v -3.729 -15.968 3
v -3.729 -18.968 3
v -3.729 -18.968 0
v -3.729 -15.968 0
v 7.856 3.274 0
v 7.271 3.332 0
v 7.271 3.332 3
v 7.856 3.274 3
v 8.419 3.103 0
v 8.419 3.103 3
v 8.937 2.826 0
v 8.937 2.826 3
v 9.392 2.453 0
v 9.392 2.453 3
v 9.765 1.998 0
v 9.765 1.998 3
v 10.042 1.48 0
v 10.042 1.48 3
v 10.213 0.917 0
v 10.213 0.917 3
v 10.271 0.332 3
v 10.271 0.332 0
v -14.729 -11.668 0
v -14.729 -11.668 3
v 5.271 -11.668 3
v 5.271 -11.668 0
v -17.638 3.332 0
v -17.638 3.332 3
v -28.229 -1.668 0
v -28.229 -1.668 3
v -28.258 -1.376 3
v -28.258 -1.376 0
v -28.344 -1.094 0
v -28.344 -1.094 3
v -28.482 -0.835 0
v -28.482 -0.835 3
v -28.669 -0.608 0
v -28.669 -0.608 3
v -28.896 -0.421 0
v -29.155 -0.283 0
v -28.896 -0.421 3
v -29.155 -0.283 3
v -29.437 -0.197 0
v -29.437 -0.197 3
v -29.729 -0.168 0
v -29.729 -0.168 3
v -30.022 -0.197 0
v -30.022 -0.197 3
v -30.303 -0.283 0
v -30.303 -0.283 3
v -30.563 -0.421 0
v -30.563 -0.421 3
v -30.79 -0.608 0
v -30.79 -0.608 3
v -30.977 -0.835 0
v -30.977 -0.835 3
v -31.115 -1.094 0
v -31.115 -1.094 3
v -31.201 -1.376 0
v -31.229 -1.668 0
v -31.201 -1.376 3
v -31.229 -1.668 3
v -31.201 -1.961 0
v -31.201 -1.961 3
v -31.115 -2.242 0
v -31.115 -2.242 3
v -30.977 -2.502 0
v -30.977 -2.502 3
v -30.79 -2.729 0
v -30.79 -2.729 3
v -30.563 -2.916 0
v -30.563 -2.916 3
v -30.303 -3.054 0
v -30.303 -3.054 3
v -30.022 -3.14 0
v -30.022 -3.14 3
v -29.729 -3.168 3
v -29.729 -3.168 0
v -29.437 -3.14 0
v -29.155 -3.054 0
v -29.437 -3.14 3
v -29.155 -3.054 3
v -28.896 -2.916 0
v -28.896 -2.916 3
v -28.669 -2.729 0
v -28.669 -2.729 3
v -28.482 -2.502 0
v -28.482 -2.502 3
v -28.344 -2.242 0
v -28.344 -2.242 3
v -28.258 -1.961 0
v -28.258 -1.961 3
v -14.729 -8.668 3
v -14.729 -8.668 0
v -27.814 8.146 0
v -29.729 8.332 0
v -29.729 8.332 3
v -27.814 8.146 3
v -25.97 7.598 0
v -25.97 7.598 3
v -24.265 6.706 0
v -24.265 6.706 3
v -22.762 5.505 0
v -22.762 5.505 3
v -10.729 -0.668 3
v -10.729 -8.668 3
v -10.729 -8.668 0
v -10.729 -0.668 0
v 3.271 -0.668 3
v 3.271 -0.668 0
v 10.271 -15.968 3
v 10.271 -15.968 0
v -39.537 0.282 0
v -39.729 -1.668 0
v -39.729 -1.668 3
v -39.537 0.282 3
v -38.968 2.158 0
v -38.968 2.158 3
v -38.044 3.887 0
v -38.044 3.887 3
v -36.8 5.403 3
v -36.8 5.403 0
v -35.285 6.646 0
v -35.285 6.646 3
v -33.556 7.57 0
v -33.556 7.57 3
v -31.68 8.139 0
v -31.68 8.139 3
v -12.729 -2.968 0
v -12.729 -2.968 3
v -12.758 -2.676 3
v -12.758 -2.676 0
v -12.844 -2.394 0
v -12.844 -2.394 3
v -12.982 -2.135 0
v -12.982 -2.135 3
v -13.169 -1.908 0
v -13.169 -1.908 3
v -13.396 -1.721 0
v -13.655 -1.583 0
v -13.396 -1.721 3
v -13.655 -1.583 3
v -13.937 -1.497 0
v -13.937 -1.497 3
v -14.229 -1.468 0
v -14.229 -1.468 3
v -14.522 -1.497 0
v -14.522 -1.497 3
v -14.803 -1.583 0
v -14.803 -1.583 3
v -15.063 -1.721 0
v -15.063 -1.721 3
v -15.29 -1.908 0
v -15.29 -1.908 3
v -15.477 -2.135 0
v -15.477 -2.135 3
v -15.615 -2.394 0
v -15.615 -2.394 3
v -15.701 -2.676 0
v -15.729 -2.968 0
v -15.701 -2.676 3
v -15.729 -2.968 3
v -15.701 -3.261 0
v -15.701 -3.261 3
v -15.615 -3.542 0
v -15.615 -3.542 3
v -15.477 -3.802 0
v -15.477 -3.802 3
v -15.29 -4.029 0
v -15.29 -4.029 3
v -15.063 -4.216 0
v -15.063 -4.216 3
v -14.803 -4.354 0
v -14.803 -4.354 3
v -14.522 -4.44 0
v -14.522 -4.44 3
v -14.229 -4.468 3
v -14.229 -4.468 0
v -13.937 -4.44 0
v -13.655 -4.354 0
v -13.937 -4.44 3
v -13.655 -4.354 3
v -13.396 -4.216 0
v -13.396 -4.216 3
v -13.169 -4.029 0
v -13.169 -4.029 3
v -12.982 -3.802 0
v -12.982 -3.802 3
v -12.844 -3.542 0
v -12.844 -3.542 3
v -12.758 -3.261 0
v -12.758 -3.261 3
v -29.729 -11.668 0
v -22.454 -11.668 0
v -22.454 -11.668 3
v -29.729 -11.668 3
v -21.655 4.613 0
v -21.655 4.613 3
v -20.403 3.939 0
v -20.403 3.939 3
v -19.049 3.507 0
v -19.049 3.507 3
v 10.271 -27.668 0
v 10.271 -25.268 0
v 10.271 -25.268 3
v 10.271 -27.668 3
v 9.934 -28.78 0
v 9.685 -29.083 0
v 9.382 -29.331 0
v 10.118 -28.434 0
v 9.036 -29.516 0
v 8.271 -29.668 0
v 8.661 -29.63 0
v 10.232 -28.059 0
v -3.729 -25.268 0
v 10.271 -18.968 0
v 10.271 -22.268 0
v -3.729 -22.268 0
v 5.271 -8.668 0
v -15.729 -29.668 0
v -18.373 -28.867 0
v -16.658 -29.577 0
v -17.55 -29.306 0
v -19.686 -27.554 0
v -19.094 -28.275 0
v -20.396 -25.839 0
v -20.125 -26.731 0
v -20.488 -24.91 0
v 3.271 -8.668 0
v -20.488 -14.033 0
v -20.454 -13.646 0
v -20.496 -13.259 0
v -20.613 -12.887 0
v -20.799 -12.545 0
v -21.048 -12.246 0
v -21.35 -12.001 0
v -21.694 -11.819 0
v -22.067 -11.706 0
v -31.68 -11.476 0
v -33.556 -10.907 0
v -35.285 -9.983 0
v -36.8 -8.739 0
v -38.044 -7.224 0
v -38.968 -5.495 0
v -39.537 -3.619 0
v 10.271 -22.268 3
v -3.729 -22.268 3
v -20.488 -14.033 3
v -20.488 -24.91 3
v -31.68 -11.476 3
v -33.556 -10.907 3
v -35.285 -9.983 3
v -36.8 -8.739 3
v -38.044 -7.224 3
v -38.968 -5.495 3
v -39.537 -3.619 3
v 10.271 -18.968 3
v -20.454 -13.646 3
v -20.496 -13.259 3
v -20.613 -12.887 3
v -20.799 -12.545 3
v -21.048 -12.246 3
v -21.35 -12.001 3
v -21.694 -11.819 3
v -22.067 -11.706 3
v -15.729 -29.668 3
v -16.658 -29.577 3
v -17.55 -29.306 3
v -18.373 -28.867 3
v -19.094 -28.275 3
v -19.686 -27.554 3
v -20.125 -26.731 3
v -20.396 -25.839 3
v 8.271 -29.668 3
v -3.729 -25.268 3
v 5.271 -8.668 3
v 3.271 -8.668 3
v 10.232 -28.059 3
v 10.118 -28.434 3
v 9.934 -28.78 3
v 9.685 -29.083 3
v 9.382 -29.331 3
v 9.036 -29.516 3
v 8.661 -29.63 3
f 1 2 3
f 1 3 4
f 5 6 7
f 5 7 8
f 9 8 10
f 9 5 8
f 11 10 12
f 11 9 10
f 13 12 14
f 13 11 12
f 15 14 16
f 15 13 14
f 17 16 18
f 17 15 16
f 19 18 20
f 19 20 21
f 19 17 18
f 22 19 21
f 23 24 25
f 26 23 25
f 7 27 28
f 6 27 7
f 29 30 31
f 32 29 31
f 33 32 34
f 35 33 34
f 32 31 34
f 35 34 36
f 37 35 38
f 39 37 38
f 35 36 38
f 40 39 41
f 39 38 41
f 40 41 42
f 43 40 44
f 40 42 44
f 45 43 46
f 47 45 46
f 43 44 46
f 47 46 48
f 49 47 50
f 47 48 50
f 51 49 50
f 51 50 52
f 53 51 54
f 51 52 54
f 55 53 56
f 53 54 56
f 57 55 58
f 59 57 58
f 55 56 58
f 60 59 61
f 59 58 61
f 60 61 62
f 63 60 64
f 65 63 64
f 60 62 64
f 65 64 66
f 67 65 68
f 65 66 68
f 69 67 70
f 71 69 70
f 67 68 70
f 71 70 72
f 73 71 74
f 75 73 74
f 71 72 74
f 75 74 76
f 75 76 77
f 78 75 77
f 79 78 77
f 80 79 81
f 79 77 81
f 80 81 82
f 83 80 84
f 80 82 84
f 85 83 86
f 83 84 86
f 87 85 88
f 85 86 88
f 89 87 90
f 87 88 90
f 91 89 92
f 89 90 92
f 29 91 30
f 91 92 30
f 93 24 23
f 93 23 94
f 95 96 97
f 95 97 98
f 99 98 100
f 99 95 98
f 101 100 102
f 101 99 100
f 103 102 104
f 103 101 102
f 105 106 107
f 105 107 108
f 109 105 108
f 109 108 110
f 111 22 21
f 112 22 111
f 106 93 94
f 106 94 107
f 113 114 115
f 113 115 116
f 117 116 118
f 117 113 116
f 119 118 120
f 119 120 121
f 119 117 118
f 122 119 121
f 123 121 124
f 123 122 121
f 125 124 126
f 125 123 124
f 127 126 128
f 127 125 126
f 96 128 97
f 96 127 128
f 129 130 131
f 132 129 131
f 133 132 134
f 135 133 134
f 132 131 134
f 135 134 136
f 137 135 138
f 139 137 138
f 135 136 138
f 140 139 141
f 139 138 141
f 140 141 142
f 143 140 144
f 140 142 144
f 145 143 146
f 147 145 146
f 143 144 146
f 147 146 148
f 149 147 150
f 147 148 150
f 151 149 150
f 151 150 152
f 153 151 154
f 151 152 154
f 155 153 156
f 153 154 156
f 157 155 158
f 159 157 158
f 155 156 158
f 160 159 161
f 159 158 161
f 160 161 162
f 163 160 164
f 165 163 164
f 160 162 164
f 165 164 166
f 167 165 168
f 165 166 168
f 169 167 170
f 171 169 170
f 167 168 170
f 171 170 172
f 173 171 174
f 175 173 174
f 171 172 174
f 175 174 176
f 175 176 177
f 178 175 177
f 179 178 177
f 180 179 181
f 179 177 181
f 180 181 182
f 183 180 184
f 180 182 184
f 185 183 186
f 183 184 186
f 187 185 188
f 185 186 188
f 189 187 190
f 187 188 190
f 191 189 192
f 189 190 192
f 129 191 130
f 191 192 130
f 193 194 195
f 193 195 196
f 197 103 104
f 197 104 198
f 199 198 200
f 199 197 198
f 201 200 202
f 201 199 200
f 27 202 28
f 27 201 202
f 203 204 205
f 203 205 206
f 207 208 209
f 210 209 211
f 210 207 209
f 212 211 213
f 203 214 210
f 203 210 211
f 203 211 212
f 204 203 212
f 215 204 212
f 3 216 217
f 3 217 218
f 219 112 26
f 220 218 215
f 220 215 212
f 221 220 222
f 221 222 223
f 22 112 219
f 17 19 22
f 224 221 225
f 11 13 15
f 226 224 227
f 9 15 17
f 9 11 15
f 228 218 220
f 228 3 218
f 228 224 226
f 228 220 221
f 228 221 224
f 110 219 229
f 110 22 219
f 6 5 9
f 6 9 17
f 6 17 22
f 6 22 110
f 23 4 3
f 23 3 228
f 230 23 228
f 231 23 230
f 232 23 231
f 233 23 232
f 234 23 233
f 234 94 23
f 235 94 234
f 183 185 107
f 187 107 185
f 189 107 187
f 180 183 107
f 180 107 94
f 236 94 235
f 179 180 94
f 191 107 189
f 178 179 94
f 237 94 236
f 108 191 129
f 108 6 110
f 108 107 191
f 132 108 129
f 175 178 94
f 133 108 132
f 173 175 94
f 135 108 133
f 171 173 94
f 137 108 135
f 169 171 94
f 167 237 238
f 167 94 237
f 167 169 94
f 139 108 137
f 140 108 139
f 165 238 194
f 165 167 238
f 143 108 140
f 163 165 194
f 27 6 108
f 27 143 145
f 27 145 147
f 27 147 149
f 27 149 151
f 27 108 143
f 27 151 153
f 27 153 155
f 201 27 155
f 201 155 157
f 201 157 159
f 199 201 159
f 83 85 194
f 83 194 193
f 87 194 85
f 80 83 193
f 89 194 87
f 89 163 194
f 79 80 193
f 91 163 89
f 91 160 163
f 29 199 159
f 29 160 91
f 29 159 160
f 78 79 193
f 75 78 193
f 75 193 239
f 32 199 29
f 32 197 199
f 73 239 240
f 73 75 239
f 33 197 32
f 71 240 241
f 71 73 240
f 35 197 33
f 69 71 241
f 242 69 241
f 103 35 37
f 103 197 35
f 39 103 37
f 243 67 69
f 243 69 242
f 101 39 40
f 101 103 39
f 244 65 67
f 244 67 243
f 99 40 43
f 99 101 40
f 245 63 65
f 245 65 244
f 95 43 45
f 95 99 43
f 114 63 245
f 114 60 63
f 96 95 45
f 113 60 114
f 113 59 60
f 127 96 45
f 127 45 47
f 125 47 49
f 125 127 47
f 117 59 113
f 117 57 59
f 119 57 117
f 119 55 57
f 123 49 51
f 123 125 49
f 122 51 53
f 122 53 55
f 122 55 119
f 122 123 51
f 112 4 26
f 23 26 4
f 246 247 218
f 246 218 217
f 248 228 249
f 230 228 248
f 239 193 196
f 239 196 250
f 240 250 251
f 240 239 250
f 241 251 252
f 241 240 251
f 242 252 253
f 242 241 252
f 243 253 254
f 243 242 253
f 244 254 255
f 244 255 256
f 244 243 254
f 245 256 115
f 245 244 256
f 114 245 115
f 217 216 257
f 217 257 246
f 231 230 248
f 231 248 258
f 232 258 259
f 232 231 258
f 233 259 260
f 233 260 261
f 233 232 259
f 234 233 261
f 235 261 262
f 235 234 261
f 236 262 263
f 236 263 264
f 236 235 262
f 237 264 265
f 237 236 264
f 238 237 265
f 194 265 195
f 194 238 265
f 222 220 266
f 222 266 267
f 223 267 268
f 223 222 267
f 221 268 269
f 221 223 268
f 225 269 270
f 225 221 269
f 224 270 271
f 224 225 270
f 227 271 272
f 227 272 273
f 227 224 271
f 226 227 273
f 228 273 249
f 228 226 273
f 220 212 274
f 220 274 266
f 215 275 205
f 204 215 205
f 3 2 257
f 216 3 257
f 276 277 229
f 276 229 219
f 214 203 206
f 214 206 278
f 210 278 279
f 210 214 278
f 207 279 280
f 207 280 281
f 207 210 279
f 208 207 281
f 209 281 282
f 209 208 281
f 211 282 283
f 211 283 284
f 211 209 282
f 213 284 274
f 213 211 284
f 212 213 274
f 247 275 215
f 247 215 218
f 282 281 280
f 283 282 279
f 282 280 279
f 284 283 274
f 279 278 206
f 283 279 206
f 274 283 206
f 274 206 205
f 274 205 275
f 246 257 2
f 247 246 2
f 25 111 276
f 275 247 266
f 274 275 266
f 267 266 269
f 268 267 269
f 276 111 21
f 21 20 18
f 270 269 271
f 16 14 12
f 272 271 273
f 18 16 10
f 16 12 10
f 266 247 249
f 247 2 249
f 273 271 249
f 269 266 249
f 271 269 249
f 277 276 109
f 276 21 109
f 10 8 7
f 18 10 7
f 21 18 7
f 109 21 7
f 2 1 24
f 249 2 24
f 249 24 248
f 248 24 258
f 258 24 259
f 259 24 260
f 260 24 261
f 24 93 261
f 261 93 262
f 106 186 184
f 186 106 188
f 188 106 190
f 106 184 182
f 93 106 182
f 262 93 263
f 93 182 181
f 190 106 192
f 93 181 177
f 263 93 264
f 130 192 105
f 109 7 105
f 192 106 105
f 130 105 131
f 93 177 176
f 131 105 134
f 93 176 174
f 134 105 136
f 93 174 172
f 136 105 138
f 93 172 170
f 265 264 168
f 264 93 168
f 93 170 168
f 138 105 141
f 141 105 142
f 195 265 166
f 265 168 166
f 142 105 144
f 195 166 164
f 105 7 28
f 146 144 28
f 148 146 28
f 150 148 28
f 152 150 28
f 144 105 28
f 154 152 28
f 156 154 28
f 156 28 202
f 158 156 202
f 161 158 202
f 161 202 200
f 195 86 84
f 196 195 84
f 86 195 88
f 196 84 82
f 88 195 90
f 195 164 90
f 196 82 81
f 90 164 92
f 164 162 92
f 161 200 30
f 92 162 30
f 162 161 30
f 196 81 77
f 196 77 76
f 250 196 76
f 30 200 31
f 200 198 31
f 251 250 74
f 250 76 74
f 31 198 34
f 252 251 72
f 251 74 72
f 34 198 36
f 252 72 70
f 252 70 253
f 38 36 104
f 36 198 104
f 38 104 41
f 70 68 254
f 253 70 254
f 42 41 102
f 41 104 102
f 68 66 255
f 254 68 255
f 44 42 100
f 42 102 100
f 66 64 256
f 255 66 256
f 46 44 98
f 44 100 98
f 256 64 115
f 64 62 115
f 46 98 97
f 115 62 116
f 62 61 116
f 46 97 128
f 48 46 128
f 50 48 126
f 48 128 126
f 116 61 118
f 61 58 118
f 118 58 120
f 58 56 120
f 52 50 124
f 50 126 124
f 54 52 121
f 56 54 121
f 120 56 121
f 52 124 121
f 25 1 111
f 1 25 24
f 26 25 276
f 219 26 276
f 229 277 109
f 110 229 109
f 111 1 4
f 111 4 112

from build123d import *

# Parameters (mm, degrees)
BOSS_EXTRUDE1_DEPTH = 3
SKETCH2_R           = 1.5
CUT_EXTRUDE1_DEPTH  = 3
SKETCH3_W           = 20
SKETCH3_H           = 3
SKETCH3_W_2         = 14
CUT_EXTRUDE2_DEPTH  = 3
SKETCH4_W           = 14
SKETCH4_H           = 8
CUT_EXTRUDE3_DEPTH  = 3
SKETCH5_R           = 1.5
CUT_EXTRUDE4_DEPTH  = 3


with BuildPart() as part:
    # Sketch1 → Boss-Extrude1 (new body)
    with BuildSketch(Plane.XY):
        with BuildLine():
            Line((10.270588235, 0.331568073), (10.270588235, -27.668431927))
            ThreePointArc((10.270588235, -27.668431927), (9.684801798, -29.08264549), (8.270588235, -29.668431927))
            Line((8.270588235, -29.668431927), (-15.729411765, -29.668431927))
            ThreePointArc((-15.729411765, -29.668431927), (-19.09389159, -28.274818754), (-20.487504763, -24.910338929))
            Line((-20.487504763, -24.910338929), (-20.487504763, -14.033468446))
            ThreePointArc((-20.487504763, -14.033468446), (-20.916042168, -12.389775022), (-22.453909691, -11.668431927))
            Line((-22.453909691, -11.668431927), (-29.729411765, -11.668431927))
            ThreePointArc((-29.729411765, -11.668431927), (-36.800479577, -8.739499739), (-39.729411765, -1.668431927))
            ThreePointArc((-39.729411765, -1.668431927), (-36.800479577, 5.402635884), (-29.729411765, 8.331568073))
            ThreePointArc((-29.729411765, 8.331568073), (-25.969894889, 7.597960729), (-22.761979852, 5.504774645))
            ThreePointArc((-22.761979852, 5.504774645), (-20.403371026, 3.939172769), (-17.6384187, 3.331568073))
            Line((-17.6384187, 3.331568073), (7.270588235, 3.331568073))
            ThreePointArc((7.270588235, 3.331568073), (9.391908579, 2.452888416), (10.270588235, 0.331568073))
        make_face()
    extrude(amount=BOSS_EXTRUDE1_DEPTH)

    # Sketch2 → Cut-Extrude1 (cut)
    with BuildSketch(Plane.XY.offset(3)):
        with Locations((-29.729411765, -1.668431927)):
            Circle(SKETCH2_R)
    extrude(amount=-CUT_EXTRUDE1_DEPTH, mode=Mode.SUBTRACT)

    # Sketch3 → Cut-Extrude2 (cut)
    with BuildSketch(Plane.XY.offset(3)):
        with Locations((-4.729411765, -10.168431927)):
            Rectangle(SKETCH3_W, SKETCH3_H)
        with Locations((3.270588235, -17.468431927)):
            Rectangle(SKETCH3_W_2, SKETCH3_H)
        with Locations((3.270588235, -23.768431927)):
            Rectangle(SKETCH3_W_2, SKETCH3_H)
    extrude(amount=-CUT_EXTRUDE2_DEPTH, mode=Mode.SUBTRACT)

    # Sketch4 → Cut-Extrude3 (cut)
    with BuildSketch(Plane.XY.offset(3)):
        with Locations((-3.729411765, -4.668431927)):
            Rectangle(SKETCH4_W, SKETCH4_H)
    extrude(amount=-CUT_EXTRUDE3_DEPTH, mode=Mode.SUBTRACT)

    # Sketch5 → Cut-Extrude4 (cut)
    with BuildSketch(Plane.XY.offset(3)):
        with Locations((-14.229411765, -2.968431927)):
            Circle(SKETCH5_R)
    extrude(amount=-CUT_EXTRUDE4_DEPTH, mode=Mode.SUBTRACT)


solid = part.part
